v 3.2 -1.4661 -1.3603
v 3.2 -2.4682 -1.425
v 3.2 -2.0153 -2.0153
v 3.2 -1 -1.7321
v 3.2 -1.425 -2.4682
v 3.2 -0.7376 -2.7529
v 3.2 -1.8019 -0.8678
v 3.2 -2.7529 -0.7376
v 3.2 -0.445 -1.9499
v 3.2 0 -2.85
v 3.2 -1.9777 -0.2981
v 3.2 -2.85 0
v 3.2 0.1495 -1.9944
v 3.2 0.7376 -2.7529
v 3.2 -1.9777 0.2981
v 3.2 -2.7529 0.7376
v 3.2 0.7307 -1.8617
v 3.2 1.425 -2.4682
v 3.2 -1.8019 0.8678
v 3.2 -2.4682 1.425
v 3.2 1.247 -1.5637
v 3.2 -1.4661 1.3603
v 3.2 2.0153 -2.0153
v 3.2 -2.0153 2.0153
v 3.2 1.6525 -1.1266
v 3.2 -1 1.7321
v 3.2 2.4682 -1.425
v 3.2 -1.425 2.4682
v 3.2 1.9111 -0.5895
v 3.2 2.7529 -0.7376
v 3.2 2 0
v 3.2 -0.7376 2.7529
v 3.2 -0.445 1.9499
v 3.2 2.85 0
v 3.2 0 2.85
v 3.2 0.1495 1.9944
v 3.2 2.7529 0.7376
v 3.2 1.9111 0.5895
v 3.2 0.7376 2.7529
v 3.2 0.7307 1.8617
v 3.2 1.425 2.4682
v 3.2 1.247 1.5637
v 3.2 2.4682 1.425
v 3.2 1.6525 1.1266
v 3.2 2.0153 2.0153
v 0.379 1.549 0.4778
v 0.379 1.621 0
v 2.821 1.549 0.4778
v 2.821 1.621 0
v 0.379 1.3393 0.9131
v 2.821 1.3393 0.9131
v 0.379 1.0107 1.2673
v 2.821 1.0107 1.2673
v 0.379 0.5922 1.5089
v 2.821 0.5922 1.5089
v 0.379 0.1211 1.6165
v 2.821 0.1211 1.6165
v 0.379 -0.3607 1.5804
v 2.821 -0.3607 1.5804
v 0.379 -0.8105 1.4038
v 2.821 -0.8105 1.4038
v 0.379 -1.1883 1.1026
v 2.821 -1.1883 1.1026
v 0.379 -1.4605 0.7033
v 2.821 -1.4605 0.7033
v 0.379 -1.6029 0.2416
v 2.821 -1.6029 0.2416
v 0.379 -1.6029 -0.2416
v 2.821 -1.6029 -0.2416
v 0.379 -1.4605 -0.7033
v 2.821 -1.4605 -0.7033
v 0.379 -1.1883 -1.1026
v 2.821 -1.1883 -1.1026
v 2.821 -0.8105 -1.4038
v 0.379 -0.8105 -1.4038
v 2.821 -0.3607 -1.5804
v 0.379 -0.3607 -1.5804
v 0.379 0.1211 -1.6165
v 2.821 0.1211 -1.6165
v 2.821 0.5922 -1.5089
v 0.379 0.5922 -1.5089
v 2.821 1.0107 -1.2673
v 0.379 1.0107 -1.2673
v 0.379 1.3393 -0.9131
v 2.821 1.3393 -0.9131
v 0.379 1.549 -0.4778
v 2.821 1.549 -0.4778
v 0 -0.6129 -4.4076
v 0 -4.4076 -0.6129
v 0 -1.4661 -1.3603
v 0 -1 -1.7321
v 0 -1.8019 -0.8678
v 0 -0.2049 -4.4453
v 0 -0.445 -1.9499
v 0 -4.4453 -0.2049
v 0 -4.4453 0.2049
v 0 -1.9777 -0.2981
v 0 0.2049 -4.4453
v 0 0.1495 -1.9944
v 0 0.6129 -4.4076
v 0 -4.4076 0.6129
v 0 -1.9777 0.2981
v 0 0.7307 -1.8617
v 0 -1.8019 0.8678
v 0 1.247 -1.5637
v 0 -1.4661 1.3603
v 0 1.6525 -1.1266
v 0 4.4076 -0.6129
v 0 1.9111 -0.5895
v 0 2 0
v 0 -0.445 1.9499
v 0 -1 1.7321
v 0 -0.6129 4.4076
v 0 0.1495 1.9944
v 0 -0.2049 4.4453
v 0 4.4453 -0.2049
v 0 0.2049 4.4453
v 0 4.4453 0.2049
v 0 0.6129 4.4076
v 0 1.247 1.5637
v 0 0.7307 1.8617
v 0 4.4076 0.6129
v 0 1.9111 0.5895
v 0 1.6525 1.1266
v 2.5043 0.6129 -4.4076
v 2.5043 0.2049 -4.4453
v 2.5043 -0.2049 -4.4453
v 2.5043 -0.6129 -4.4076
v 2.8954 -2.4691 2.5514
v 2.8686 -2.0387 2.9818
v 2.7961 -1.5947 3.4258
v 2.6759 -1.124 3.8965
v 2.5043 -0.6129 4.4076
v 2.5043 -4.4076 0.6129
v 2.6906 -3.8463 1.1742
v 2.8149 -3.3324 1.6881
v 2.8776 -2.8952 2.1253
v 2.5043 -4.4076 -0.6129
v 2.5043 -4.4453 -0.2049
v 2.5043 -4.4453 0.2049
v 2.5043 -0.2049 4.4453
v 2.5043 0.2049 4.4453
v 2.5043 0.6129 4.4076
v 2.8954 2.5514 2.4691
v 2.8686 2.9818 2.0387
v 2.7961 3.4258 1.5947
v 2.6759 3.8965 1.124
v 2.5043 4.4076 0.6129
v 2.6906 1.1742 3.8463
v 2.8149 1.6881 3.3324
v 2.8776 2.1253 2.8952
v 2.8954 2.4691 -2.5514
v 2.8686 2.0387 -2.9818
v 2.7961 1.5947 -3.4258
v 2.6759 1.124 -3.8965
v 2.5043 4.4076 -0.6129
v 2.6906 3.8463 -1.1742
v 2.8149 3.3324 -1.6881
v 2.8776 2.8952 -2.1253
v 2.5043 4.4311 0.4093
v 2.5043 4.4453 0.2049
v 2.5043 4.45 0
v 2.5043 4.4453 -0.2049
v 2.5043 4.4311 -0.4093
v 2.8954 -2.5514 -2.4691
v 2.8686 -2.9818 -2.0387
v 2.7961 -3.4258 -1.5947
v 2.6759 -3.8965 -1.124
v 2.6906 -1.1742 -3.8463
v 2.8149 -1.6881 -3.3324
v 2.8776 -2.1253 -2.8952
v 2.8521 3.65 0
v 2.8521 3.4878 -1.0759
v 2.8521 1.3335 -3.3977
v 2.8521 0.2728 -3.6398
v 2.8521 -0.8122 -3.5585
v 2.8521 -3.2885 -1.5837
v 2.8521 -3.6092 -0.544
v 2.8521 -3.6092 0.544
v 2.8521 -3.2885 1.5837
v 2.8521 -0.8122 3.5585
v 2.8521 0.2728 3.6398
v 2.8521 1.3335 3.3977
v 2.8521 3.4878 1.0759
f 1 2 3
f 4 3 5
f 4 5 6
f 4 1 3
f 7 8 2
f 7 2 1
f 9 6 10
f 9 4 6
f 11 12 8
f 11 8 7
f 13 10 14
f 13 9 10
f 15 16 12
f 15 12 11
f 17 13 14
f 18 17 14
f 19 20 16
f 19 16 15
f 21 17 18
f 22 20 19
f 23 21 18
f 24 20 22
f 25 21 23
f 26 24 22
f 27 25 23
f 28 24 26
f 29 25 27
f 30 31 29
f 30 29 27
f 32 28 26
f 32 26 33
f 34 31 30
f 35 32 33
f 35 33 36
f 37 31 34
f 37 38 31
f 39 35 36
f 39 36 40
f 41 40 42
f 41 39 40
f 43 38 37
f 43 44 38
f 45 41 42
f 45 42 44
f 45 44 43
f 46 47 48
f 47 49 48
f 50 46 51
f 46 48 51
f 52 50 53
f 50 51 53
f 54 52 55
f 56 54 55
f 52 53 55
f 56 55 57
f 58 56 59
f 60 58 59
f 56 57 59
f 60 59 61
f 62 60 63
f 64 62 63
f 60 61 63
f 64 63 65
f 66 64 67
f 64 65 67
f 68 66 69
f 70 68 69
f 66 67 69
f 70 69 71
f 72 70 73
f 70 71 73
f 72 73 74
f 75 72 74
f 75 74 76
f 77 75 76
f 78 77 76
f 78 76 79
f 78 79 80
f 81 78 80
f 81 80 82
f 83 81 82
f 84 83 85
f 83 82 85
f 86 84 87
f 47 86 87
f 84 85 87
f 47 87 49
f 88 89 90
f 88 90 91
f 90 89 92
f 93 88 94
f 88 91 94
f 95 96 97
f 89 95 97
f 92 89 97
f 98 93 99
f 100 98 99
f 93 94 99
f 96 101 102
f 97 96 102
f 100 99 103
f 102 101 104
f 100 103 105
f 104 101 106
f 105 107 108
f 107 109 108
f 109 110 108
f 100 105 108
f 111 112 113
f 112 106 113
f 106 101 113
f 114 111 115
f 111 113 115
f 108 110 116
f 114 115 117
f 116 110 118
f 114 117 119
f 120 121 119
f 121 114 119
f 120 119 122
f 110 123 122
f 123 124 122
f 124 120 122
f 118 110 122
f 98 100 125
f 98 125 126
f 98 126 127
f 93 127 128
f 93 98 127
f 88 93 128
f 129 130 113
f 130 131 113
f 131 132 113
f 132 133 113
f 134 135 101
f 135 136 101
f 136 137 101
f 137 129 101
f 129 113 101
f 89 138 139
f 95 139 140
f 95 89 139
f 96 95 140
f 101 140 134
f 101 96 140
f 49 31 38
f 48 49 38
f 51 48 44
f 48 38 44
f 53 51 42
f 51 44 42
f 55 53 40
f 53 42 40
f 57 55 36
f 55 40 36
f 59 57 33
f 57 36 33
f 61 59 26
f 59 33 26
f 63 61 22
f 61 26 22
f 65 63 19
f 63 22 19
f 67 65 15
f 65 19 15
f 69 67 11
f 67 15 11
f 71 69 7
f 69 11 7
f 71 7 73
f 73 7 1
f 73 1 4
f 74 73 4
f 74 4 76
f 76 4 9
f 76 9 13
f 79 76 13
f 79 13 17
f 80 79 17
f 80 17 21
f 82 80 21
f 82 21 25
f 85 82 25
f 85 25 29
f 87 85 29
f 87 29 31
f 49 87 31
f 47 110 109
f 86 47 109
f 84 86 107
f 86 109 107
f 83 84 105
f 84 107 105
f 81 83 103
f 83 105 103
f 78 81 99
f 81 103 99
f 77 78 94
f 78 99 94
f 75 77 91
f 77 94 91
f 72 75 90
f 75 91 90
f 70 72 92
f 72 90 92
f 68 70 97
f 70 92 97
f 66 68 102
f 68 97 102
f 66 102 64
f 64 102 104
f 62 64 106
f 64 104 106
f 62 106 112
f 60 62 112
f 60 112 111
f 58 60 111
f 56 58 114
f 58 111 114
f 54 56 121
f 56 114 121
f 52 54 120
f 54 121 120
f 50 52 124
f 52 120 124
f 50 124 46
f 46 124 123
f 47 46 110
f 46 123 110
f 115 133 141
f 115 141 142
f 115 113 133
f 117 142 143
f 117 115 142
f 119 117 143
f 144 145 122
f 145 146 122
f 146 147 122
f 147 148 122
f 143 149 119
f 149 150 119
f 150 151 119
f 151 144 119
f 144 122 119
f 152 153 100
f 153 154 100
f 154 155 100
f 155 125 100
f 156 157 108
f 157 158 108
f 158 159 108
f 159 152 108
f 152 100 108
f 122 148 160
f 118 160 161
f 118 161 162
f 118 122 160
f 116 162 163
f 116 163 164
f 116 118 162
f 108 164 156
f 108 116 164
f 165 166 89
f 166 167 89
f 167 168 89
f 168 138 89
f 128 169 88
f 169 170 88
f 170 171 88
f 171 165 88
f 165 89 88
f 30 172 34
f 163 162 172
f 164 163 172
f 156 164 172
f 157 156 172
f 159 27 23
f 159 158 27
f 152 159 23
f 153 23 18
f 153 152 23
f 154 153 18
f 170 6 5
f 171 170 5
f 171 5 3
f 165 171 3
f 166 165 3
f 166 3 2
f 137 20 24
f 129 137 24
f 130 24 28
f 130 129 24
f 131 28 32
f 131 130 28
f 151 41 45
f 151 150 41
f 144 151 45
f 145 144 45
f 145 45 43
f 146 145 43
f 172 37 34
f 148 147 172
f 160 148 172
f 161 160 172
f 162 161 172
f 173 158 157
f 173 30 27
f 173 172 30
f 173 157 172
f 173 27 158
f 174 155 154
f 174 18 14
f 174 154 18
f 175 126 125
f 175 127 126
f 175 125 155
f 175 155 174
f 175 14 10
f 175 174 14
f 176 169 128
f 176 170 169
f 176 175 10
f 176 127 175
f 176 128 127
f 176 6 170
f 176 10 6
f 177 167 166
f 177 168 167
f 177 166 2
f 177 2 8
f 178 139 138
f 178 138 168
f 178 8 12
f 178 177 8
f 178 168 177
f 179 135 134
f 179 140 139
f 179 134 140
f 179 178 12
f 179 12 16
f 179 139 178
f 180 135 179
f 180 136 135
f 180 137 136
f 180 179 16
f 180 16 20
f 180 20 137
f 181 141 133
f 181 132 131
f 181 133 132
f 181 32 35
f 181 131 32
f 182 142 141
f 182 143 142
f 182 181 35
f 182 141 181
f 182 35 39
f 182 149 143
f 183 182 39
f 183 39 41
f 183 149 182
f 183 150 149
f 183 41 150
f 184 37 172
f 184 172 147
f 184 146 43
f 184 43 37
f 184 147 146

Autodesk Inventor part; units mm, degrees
sketch "Sketch_2" plane through (0, 0, 0) normal (0, 0, 1) x (1, 0, 0)
  line L0 (3.2, 0) -> (0, 0)
  line L1 (0, 0) -> (0, 4.9497)
  line L2 (0, 4.9497) -> (2.287, 4.9497)
  line L3 (2.287, 4.9497) -> (3.2, 2.85)
  line L4 (3.2, 2.85) -> (3.2, 0)
  line L5 (3.2, 0) -> (0, 0)
revolve "Revolution1" add sketch "Sketch_2" angle 360 about axis through (3.2, 0, 0) along (1, 0, 0)
sketch "Skizze_2" plane through (0, 0, 0) normal (1, 0, 0) x (0, 1, 0)
  line L0 (14, 14) -> (-14, 14)
  line L1 (-14, 14) -> (-14, -14)
  line L2 (-14, -14) -> (14, -14)
  line L3 (14, -14) -> (14, 14)
  line L4 (0, 5.0205) -> (-5.0205, 0)
  line L5 (-5.0205, 0) -> (0, -5.0205)
  line L6 (0, -5.0205) -> (5.0205, 0)
  line L7 (5.0205, 0) -> (0, 5.0205)
extrude "Extrusion1" cut sketch "Skizze_2" along normal blind 3.2
sketch "Sketch_1" plane through (0, 0, 0) normal (0, 0, 1) x (1, 0, 0)
  line L0 (3.2, 0) -> (0, 0)
  line L1 (0, 0) -> (0, 2)
  line L2 (0, 2) -> (0.379, 1.621)
  line L3 (0.379, 1.621) -> (2.821, 1.621)
  line L4 (2.821, 1.621) -> (3.2, 2)
  line L5 (3.2, 2) -> (3.2, 0)
  line L6 (3.2, 0) -> (0, 0)
revolve "Revolution2" cut sketch "Sketch_1" angle 360 about axis through (3.2, 0, 0) along (1, 0, 0)
sketch "Sketch_3" plane through (0, 0, 0) normal (1, 0, 0) x (0, 1, 0)
  line L0 (7, 7) -> (-7, 7)
  line L1 (-7, 7) -> (-7, -7)
  line L2 (-7, -7) -> (7, -7)
  line L3 (7, -7) -> (7, 7)
  circle A0 centre (0, 0) radius 4.45
extrude "Extrusion2" cut sketch "Sketch_3" along normal blind 3.2
ref_plane "IP1_XY" through (0, 0, 0) normal (1, 0, 0) x (0, 0, -1)
ref_plane "IP1_YZ" through (0, 0, 0) normal (0, 0, -1) x (0, 1, 0)
ref_plane "IP1_ZX" through (0, 0, 0) normal (0, 1, 0) x (1, 0, 0)
ref_plane "IP2_XY" through (3.2, 0, 0) normal (1, 0, 0) x (0, 0, -1)
ref_plane "IP2_YZ" through (3.2, 0, 0) normal (0, 0, -1) x (0, 1, 0)
ref_plane "IP2_ZX" through (3.2, 0, 0) normal (0, 1, 0) x (1, 0, 0)
properties part number "DIN 557 - M4"
